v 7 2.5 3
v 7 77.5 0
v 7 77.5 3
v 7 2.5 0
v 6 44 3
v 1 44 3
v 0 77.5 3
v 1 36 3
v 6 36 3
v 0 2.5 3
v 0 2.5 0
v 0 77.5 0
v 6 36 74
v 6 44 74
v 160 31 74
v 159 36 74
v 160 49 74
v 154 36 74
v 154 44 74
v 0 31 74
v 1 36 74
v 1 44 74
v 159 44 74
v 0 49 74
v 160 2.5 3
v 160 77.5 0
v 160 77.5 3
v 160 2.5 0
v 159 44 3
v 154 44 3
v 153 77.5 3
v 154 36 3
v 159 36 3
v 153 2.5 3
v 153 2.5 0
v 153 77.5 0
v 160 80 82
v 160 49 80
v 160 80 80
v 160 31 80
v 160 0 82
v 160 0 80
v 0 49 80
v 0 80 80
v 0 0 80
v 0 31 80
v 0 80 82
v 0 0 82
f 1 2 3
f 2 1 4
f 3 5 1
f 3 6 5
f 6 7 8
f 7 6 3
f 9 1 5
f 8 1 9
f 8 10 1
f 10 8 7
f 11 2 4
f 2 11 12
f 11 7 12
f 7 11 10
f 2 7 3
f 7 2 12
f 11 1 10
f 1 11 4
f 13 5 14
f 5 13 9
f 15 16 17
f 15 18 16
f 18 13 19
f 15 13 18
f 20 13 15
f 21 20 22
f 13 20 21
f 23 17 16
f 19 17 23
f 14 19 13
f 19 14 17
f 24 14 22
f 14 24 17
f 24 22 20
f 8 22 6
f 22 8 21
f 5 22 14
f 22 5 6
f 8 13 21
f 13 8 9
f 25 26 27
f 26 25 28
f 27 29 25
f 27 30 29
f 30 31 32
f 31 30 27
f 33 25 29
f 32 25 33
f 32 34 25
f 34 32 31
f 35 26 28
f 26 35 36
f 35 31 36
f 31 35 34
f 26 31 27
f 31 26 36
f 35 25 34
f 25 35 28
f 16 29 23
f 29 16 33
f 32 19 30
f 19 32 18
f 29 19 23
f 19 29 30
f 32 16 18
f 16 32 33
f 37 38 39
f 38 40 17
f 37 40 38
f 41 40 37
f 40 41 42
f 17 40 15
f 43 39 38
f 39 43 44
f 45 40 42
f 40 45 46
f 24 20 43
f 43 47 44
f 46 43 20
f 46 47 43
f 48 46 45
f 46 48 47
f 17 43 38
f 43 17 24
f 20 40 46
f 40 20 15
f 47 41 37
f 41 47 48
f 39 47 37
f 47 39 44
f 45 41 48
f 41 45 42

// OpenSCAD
leg_length = 5;
leg_width = 8;
leg_height = 71;

foot_length = 7;
foot_width = 75;
foot_height = 3;

base_length = 160;
base_width = 18;
base_height = 6;

plate_height = 2;

length = base_length;
width = 80;
height = foot_height + leg_height + base_height + plate_height;

module leg() {
  cube([foot_length, foot_width, foot_height]);

  translate([(foot_length - leg_length) / 2, foot_width / 2 - leg_width / 2, foot_height])
  cube([leg_length, leg_width, leg_height]);
}

module base() {
  translate([0, width / 2 - foot_width / 2, 0])
  leg();

  translate([length - foot_length, width / 2 - foot_width / 2, 0])
    leg();

  translate([0, width / 2 - base_width / 2, foot_height + leg_height])
    cube([base_length, base_width, base_height]);
}

translate([0, 0, height - plate_height])
  cube([length, width, plate_height]);

base();
